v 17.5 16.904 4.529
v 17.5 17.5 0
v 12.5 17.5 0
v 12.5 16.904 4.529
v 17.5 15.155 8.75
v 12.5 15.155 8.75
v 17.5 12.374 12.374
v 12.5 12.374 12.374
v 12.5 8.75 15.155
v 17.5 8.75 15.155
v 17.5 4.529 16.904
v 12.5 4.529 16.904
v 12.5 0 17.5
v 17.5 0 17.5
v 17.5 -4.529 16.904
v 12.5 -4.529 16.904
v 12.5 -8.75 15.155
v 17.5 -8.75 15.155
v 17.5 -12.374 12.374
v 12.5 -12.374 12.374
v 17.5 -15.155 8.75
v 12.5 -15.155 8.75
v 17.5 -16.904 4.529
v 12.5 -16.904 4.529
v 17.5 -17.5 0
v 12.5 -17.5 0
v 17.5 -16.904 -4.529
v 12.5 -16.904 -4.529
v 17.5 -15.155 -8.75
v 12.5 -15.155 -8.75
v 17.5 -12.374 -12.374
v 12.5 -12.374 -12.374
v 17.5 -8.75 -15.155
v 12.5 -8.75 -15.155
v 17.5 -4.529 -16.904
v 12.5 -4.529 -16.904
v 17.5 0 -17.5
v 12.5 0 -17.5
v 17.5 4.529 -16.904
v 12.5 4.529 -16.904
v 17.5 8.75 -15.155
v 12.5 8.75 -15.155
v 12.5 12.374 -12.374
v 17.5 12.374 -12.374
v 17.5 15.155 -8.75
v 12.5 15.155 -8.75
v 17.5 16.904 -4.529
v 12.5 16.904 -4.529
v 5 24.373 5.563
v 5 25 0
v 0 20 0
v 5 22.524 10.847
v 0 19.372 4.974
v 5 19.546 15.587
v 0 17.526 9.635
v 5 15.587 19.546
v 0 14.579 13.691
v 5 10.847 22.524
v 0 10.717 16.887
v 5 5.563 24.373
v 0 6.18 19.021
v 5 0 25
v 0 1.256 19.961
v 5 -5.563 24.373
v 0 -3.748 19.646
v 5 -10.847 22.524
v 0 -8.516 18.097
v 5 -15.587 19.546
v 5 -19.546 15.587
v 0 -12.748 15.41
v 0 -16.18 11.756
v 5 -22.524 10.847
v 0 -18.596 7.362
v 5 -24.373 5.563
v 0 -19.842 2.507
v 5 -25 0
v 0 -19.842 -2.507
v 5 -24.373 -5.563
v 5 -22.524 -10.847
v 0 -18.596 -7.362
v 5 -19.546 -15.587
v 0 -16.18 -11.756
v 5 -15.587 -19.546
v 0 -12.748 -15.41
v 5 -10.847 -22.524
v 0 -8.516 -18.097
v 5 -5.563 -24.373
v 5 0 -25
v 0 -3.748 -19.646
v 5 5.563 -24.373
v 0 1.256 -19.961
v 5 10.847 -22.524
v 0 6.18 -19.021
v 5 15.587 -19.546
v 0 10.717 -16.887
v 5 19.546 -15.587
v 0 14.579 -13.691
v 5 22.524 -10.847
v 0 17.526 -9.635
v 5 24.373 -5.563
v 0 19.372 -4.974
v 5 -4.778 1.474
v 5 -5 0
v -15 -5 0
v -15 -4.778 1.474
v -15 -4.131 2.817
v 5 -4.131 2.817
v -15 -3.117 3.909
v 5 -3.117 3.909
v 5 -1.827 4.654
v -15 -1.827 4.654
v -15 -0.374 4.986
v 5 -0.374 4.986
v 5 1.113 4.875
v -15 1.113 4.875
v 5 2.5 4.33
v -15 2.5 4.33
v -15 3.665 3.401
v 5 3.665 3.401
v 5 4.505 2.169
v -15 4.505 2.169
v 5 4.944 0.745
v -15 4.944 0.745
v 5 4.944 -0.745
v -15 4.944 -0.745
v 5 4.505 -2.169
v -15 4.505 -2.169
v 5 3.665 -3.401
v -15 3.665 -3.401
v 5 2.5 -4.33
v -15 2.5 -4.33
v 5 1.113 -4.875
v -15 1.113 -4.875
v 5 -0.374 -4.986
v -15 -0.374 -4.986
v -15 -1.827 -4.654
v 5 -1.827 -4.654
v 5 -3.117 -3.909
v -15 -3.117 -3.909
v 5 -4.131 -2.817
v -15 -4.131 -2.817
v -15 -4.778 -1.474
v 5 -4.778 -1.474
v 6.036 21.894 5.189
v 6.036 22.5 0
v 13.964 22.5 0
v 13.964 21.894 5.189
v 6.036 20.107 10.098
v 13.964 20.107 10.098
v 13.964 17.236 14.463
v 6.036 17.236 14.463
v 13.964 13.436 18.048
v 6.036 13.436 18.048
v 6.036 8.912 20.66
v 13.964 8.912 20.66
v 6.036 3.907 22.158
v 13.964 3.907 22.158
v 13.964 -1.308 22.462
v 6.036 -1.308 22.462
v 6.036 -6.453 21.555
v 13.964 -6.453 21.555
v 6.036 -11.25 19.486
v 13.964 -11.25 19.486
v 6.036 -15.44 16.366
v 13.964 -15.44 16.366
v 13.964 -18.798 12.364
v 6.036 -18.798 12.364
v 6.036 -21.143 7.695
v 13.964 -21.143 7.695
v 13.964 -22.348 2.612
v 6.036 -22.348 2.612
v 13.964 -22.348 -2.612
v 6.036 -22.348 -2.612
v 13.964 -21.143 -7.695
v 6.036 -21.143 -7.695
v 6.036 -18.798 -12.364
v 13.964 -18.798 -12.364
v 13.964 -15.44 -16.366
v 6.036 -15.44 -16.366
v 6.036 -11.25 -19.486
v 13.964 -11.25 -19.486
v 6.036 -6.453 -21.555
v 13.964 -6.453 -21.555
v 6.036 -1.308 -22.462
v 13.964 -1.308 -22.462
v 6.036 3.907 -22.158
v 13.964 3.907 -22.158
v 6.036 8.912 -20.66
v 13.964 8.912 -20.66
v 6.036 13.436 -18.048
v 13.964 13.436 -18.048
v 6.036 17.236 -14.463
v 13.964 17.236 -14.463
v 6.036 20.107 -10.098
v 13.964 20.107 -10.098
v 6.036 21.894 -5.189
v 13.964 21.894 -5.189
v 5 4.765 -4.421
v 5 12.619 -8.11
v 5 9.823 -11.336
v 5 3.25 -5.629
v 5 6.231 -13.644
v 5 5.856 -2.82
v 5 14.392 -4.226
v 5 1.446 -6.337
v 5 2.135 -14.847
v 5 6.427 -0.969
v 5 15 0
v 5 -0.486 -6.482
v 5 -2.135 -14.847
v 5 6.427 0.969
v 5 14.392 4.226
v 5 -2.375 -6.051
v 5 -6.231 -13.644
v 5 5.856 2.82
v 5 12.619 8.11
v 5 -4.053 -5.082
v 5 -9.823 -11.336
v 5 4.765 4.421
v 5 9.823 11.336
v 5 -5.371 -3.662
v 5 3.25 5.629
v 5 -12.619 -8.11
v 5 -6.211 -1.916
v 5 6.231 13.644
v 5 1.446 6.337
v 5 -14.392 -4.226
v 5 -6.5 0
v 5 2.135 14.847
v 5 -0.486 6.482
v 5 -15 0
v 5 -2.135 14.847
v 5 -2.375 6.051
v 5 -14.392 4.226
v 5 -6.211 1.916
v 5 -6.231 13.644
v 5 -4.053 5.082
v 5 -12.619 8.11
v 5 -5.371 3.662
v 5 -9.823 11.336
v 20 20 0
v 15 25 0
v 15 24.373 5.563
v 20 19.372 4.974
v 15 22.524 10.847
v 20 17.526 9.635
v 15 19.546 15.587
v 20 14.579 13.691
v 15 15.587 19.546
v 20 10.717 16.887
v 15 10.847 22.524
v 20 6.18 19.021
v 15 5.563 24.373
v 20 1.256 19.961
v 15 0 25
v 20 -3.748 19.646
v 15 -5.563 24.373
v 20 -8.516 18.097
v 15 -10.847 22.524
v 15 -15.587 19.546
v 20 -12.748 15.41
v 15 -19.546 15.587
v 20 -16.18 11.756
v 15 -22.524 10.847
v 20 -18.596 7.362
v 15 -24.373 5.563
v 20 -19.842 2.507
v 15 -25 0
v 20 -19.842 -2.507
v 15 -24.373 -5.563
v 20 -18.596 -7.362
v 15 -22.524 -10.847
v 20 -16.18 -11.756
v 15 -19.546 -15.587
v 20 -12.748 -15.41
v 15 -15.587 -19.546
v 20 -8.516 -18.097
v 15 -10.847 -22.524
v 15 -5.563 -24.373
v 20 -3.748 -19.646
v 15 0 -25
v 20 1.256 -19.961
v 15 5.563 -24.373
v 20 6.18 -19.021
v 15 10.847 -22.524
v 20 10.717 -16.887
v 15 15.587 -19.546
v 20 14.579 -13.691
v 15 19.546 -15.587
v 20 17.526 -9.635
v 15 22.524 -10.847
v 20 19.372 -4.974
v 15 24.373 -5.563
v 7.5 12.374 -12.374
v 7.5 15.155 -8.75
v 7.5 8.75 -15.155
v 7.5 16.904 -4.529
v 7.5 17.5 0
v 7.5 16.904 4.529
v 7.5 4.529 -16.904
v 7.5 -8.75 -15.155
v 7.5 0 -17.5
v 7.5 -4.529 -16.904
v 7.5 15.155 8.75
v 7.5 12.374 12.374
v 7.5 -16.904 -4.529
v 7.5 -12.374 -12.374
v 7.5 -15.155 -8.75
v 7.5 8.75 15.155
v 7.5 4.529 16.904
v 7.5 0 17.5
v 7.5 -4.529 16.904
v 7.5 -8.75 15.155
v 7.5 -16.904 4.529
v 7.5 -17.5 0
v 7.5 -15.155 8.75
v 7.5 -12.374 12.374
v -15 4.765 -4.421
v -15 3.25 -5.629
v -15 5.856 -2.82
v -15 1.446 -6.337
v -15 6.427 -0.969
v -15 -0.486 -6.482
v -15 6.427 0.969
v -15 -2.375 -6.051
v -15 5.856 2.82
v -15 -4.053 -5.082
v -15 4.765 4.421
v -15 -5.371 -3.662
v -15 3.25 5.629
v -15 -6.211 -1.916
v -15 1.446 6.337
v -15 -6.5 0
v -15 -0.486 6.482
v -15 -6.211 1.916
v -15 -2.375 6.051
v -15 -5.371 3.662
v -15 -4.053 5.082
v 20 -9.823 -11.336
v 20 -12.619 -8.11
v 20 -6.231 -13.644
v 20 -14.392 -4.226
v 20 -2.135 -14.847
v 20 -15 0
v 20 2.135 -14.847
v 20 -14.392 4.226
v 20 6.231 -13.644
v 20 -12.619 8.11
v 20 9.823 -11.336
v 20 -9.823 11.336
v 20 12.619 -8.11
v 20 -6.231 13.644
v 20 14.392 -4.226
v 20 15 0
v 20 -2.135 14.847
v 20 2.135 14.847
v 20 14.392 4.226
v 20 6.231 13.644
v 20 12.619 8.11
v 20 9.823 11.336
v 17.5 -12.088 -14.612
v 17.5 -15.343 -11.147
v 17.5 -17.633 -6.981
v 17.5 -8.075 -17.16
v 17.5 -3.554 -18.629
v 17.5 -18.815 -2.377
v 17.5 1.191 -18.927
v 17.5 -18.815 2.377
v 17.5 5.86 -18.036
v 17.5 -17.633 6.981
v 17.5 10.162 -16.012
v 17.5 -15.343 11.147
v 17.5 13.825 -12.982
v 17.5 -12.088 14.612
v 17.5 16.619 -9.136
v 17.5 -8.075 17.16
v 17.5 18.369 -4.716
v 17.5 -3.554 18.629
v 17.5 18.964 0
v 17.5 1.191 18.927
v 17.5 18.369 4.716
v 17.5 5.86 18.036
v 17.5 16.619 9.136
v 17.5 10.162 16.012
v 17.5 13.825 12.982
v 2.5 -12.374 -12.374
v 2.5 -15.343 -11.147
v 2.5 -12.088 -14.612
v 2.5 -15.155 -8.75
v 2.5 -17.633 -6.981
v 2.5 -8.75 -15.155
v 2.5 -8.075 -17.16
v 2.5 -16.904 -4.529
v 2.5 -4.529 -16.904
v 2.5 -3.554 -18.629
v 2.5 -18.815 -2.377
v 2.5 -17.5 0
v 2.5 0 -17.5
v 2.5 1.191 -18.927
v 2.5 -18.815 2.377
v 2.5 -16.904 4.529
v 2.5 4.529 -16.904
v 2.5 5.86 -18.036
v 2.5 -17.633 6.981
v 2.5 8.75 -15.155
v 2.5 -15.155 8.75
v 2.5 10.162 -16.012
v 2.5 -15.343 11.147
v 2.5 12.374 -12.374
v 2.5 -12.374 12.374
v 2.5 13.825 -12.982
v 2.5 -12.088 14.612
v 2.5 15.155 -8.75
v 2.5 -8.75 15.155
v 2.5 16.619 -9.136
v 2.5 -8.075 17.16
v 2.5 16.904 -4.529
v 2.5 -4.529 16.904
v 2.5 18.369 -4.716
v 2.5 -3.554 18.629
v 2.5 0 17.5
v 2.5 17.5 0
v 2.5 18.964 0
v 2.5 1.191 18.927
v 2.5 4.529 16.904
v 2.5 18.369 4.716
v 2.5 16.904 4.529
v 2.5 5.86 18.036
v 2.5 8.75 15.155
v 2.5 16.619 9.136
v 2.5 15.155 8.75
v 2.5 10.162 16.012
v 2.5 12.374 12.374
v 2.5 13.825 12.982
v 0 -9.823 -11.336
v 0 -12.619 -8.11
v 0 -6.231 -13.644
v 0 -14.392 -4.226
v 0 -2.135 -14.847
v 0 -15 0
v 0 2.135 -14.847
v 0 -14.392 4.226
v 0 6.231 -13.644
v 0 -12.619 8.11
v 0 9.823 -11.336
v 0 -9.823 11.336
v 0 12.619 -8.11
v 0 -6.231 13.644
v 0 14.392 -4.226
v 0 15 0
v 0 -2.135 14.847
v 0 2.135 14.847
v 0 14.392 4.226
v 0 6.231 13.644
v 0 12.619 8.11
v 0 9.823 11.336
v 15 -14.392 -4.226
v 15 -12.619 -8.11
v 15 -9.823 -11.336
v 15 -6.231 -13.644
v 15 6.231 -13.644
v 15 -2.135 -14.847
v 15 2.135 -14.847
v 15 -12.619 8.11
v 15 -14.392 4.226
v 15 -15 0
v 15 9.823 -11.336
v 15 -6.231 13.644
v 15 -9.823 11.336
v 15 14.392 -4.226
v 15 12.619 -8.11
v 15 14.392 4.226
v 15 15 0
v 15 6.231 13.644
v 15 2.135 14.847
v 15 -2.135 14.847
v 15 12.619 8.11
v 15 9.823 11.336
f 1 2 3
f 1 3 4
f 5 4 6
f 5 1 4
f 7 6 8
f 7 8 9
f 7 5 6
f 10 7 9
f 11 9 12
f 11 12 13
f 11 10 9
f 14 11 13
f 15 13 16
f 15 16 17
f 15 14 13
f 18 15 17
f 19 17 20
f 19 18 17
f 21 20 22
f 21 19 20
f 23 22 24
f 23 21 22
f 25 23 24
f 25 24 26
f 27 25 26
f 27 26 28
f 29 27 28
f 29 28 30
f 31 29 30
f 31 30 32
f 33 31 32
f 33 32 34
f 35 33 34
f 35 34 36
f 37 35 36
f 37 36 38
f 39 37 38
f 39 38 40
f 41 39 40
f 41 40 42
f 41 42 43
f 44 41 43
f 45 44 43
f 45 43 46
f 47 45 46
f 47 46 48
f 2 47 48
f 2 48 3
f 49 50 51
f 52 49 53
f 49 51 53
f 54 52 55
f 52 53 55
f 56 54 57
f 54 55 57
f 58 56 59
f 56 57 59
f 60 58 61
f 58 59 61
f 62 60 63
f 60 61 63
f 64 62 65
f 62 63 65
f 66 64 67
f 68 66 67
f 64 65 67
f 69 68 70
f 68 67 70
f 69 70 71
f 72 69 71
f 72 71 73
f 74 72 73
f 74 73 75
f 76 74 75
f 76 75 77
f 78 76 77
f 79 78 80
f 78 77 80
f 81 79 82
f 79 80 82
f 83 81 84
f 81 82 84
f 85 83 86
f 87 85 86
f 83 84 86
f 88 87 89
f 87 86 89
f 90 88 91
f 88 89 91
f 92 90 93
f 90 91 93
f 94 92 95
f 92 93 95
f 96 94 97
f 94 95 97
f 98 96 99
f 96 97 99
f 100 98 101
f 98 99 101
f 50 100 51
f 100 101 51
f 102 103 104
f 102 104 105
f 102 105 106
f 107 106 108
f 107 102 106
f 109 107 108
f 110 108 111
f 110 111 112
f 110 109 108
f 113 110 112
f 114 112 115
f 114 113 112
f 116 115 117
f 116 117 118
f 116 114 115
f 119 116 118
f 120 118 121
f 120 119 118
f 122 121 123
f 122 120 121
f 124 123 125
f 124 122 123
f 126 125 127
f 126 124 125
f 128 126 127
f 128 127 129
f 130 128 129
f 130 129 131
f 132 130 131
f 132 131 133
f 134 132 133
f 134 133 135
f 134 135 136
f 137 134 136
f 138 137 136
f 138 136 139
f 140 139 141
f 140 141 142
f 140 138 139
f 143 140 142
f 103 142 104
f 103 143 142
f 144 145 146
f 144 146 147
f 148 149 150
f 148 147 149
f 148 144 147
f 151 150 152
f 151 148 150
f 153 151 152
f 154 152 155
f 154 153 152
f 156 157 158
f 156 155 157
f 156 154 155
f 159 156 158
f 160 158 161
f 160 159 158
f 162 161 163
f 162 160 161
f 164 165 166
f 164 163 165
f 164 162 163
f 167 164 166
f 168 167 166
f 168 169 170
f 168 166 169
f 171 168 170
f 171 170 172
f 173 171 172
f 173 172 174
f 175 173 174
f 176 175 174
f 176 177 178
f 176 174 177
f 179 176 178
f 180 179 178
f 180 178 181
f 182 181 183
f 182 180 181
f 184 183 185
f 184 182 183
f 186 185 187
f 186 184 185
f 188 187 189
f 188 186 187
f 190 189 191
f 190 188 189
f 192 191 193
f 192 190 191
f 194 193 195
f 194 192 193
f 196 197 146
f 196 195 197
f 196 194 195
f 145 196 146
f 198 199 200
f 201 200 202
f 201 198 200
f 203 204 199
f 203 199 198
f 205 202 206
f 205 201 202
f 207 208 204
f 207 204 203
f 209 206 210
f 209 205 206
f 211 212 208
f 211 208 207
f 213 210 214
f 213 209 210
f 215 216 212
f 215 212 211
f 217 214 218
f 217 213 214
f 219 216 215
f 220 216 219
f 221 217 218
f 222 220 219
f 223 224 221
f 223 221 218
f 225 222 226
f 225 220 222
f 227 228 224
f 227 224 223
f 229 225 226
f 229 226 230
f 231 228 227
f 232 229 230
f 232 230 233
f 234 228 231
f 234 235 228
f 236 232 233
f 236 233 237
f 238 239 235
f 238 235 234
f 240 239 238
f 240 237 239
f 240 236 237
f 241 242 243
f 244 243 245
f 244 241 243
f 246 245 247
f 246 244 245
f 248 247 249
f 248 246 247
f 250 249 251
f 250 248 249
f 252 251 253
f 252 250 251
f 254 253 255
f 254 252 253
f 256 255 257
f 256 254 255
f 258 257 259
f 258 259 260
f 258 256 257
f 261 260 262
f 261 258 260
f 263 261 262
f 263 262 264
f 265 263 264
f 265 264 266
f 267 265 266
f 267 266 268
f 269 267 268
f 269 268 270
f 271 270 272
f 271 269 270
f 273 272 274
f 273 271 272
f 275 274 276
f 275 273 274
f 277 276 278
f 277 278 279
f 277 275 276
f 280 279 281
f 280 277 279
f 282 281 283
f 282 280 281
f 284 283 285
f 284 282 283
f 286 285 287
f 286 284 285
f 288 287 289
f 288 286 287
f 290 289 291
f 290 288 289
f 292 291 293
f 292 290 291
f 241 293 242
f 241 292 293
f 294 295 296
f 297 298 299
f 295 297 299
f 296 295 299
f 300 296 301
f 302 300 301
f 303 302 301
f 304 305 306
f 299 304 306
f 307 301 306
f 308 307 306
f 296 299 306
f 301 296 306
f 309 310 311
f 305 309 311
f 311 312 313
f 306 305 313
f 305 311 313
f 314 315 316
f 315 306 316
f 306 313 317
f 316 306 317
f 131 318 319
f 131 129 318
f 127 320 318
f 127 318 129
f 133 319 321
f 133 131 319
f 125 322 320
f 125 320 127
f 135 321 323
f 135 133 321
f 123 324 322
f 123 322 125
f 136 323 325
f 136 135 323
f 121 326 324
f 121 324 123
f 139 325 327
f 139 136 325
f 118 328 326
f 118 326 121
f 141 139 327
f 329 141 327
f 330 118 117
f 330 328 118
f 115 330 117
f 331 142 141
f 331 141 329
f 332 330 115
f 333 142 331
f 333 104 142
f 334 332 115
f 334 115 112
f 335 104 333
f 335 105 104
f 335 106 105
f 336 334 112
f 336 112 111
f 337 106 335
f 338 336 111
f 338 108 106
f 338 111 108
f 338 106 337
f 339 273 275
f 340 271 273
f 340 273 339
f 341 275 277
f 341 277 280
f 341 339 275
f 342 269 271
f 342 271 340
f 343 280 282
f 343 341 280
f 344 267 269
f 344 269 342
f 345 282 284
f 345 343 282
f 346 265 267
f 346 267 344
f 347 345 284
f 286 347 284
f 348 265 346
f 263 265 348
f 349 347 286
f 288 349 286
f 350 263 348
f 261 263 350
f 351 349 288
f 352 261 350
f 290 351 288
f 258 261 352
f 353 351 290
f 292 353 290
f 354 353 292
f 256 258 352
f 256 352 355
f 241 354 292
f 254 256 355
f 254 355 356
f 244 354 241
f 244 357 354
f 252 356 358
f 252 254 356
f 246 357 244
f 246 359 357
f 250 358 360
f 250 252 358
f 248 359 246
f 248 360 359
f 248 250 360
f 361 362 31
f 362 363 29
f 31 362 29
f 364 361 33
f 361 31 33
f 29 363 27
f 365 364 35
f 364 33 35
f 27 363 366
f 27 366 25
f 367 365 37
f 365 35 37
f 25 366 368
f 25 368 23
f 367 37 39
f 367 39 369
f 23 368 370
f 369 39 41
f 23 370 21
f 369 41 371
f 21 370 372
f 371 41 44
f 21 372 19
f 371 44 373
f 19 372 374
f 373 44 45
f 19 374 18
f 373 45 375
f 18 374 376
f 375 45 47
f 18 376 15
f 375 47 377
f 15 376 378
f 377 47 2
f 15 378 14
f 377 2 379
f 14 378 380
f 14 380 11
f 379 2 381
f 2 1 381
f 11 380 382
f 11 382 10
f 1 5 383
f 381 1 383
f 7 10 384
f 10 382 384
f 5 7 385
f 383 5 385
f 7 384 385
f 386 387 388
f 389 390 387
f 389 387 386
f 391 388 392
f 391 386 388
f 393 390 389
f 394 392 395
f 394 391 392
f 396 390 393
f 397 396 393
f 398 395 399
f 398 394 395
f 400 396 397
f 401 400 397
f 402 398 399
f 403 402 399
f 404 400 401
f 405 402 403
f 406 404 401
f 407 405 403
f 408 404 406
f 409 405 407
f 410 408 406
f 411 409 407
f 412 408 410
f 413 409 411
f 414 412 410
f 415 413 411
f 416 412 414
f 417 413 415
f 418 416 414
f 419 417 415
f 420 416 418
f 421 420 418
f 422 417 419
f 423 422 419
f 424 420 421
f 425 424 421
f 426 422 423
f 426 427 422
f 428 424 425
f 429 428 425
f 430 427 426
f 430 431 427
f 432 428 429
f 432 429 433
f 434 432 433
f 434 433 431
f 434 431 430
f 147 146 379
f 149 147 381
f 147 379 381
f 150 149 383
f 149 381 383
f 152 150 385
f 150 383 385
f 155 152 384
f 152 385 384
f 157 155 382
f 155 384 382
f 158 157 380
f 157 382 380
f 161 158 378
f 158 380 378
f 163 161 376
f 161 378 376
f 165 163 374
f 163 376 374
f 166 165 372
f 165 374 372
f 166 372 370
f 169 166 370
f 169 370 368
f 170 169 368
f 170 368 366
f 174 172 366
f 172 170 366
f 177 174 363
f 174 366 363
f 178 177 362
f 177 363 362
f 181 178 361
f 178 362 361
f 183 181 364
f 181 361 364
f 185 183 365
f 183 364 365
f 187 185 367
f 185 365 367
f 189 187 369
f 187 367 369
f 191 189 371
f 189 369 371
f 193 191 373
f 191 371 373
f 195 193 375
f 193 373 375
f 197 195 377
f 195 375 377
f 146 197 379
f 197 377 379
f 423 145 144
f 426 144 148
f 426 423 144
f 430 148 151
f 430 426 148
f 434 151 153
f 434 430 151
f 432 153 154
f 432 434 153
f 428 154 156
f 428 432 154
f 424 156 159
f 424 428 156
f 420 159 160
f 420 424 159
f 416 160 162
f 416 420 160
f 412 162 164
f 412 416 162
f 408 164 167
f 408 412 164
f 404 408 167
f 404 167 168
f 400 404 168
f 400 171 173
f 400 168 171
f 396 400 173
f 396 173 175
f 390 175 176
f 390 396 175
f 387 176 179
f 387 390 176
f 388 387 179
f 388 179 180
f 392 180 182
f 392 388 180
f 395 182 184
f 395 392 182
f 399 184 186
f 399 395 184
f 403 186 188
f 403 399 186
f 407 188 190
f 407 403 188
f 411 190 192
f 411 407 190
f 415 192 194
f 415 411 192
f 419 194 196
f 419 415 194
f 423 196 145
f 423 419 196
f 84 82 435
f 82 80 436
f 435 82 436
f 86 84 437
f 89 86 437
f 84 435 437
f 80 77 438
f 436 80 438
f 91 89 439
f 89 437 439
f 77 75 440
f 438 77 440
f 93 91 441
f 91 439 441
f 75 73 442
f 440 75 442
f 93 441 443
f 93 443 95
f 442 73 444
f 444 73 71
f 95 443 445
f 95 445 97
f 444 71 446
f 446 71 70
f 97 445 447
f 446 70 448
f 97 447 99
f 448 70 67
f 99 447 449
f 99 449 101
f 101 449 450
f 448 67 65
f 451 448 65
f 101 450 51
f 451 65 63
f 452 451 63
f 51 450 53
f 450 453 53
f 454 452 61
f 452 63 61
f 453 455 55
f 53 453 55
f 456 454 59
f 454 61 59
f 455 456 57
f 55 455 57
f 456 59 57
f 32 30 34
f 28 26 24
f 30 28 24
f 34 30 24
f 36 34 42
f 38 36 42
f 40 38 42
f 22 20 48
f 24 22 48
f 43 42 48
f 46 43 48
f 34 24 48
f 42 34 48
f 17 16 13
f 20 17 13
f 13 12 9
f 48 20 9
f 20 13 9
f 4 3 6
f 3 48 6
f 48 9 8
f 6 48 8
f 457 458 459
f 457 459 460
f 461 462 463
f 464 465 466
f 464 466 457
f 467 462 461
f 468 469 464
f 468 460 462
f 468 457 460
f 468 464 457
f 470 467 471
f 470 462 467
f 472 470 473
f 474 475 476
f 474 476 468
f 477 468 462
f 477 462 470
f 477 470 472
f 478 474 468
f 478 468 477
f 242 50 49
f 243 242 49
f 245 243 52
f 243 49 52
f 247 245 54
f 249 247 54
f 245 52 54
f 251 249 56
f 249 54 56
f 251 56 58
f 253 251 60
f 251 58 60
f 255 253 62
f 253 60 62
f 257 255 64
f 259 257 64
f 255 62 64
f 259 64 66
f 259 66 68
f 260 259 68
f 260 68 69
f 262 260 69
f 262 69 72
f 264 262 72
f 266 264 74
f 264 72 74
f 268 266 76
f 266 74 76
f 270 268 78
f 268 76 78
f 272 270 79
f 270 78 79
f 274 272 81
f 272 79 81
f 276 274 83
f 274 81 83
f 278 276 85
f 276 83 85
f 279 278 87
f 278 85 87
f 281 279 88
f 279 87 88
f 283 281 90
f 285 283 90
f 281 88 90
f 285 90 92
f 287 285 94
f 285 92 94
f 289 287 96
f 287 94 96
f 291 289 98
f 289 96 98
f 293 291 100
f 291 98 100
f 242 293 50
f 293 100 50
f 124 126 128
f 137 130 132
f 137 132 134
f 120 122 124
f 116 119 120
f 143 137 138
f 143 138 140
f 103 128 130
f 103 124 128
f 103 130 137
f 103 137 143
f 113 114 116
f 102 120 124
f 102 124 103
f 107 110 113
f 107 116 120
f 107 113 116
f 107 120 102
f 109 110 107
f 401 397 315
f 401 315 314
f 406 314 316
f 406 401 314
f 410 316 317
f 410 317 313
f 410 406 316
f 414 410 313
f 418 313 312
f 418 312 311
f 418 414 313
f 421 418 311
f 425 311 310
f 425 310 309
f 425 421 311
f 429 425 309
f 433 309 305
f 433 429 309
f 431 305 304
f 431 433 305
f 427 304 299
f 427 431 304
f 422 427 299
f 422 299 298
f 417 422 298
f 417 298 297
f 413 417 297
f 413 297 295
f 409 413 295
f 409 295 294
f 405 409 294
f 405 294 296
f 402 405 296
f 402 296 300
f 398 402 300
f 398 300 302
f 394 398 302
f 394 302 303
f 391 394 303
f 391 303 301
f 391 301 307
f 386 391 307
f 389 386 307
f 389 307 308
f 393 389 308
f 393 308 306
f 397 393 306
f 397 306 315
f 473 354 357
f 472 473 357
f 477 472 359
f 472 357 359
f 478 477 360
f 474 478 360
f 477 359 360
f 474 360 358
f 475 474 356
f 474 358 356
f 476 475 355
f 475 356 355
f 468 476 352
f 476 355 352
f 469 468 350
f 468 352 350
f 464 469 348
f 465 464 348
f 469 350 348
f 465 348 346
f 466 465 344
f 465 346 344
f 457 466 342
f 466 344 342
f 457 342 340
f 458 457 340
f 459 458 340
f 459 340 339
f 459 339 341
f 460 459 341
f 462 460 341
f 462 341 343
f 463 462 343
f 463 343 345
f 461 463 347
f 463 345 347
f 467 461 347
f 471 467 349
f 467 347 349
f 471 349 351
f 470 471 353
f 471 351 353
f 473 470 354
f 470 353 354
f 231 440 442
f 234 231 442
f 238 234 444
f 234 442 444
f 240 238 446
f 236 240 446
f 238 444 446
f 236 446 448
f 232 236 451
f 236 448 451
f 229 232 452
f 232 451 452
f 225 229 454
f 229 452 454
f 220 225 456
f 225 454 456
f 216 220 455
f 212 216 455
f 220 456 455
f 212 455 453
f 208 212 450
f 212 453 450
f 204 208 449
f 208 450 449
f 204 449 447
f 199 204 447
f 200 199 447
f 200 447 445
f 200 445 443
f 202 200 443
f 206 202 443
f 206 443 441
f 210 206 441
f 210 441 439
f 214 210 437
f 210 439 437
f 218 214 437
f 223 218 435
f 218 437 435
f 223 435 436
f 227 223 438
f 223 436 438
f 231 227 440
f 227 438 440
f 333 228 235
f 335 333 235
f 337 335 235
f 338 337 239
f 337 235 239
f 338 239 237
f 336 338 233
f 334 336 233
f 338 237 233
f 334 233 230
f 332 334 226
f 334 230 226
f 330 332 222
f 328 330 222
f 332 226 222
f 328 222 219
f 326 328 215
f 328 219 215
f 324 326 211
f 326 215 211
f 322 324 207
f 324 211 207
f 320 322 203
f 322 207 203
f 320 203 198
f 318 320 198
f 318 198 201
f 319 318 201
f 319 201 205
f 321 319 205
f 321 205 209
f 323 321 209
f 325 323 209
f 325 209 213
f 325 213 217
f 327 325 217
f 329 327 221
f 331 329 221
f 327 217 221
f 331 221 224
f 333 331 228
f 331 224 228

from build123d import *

# Parameters (mm, degrees)
F0_R     = 25
F1_DEPTH = 20
F2_SIZE  = 5
F3_SIZE  = 5
F4_R     = 15
F5_DEPTH = 5
F6_R     = 15
F7_DEPTH = 5
F8_R     = 6.5
F8_R_2   = 5
F9_DEPTH = 20
F10_T    = 2.5


# Not quite as in the source:
# - a shell that OpenCascade refuses in one call is made with other operations: the cavity is built on its own and cut out


with BuildPart() as f1:
    # F0 (on Right) → F1 (new body)
    with BuildSketch(Plane.YZ):
        Circle(F0_R)
    extrude(amount=F1_DEPTH)

    # F2
    f2_edges = [f1.edges().sort_by_distance(p)[0] for p in [
        (20, -25, 0),
    ]]
    chamfer(f2_edges, length=F2_SIZE)

    # F3
    f3_edges = [f1.edges().sort_by_distance(p)[0] for p in [
        (0, -25, 0),
    ]]
    chamfer(f3_edges, length=F3_SIZE)

    # F4 (on face) → F5 (cut)
    with BuildSketch(Plane(origin=(0, 0, 0), x_dir=(0, -1, 0), z_dir=(-1, 0, 0))):
        Circle(F4_R)
    extrude(amount=-F5_DEPTH, mode=Mode.SUBTRACT)

    # F6 (on face) → F7 (cut)
    with BuildSketch(Plane.YZ.offset(20)):
        Circle(F6_R)
    extrude(amount=-F7_DEPTH, mode=Mode.SUBTRACT)

    # F8 (on face) → F9 (join)
    with BuildSketch(Plane(origin=(5, 0, 0), x_dir=(0, -1, 0), z_dir=(-1, 0, 0))):
        Circle(F8_R)
        Circle(F8_R_2, mode=Mode.SUBTRACT)
    extrude(amount=F9_DEPTH)

    # F10: shell of thickness 2.5, made by hand


with BuildPart() as f10_core1:
    # F10_t2: copy of F1
    add(f1.part)

    # the walls: a layer under each face that stays
    f10_faces = [f10_core1.faces().sort_by_distance(p)[0] for p in [
        (10, -25, 0),
        (2.5, -22.5, 0),
        (17.5, -22.5, 0),
        (0, -13.3333333333, -13.3333333333),
        (20, -13.3333333333, -13.3333333333),
        (2.5, 15, 0),
        (17.5, -15, 0),
        (5, 10, -10),
        (15, 0, 0),
        (-5, 6.5, 0),
        (-5, 5, 0),
        (5, 0, 0),
    ]]
    thicken(f10_faces, amount=-F10_T, mode=Mode.SUBTRACT)

    # F10_s3 → F10_t4 (revolve, cut)
    with BuildSketch(Plane.XY):
        Polygon((4.975, -14.975), (5, -17.5), (7.5, -17.5), (7.5, -15), align=None)
    revolve(axis=Axis((5, 0, 0), (-1, 0, 0)), mode=Mode.SUBTRACT)

    # F10_s5 → F10_t6 (revolve, cut)
    with BuildSketch(Plane.XY):
        Polygon((15.025, 14.975), (15, 17.5), (12.5, 17.5), (12.5, 15), align=None)
    revolve(axis=Axis((15, 0, 0), (1, 0, 0)), mode=Mode.SUBTRACT)

    # F10_s7 → F10_t8 (revolve, cut)
    with BuildSketch(Plane.XY):
        Polygon((4.975, -6.525), (7.5, -6.5), (7.5, -4), (5, -4), align=None)
    revolve(axis=Axis((5, 0, 0), (-1, 0, 0)), mode=Mode.SUBTRACT)

    # F10_s9 → F10_t10 (revolve, cut)
    with BuildSketch(Plane.XY):
        Polygon((4.975, -4.975), (5, -7.5), (7.5, -7.5), (7.5, -5), align=None)
    revolve(axis=Axis((5, 0, 0), (-1, 0, 0)), mode=Mode.SUBTRACT)


with BuildPart() as f1_1:
    add(f1.part)

    # what is left inside the walls is the cavity
    f10_cavity = [f10_core1.part.solids().sort_by_distance(p)[0] for p in [
        (11.321489, -22.475, 0),
    ]]
    add(f10_cavity, mode=Mode.SUBTRACT)


solid = f1_1.part
